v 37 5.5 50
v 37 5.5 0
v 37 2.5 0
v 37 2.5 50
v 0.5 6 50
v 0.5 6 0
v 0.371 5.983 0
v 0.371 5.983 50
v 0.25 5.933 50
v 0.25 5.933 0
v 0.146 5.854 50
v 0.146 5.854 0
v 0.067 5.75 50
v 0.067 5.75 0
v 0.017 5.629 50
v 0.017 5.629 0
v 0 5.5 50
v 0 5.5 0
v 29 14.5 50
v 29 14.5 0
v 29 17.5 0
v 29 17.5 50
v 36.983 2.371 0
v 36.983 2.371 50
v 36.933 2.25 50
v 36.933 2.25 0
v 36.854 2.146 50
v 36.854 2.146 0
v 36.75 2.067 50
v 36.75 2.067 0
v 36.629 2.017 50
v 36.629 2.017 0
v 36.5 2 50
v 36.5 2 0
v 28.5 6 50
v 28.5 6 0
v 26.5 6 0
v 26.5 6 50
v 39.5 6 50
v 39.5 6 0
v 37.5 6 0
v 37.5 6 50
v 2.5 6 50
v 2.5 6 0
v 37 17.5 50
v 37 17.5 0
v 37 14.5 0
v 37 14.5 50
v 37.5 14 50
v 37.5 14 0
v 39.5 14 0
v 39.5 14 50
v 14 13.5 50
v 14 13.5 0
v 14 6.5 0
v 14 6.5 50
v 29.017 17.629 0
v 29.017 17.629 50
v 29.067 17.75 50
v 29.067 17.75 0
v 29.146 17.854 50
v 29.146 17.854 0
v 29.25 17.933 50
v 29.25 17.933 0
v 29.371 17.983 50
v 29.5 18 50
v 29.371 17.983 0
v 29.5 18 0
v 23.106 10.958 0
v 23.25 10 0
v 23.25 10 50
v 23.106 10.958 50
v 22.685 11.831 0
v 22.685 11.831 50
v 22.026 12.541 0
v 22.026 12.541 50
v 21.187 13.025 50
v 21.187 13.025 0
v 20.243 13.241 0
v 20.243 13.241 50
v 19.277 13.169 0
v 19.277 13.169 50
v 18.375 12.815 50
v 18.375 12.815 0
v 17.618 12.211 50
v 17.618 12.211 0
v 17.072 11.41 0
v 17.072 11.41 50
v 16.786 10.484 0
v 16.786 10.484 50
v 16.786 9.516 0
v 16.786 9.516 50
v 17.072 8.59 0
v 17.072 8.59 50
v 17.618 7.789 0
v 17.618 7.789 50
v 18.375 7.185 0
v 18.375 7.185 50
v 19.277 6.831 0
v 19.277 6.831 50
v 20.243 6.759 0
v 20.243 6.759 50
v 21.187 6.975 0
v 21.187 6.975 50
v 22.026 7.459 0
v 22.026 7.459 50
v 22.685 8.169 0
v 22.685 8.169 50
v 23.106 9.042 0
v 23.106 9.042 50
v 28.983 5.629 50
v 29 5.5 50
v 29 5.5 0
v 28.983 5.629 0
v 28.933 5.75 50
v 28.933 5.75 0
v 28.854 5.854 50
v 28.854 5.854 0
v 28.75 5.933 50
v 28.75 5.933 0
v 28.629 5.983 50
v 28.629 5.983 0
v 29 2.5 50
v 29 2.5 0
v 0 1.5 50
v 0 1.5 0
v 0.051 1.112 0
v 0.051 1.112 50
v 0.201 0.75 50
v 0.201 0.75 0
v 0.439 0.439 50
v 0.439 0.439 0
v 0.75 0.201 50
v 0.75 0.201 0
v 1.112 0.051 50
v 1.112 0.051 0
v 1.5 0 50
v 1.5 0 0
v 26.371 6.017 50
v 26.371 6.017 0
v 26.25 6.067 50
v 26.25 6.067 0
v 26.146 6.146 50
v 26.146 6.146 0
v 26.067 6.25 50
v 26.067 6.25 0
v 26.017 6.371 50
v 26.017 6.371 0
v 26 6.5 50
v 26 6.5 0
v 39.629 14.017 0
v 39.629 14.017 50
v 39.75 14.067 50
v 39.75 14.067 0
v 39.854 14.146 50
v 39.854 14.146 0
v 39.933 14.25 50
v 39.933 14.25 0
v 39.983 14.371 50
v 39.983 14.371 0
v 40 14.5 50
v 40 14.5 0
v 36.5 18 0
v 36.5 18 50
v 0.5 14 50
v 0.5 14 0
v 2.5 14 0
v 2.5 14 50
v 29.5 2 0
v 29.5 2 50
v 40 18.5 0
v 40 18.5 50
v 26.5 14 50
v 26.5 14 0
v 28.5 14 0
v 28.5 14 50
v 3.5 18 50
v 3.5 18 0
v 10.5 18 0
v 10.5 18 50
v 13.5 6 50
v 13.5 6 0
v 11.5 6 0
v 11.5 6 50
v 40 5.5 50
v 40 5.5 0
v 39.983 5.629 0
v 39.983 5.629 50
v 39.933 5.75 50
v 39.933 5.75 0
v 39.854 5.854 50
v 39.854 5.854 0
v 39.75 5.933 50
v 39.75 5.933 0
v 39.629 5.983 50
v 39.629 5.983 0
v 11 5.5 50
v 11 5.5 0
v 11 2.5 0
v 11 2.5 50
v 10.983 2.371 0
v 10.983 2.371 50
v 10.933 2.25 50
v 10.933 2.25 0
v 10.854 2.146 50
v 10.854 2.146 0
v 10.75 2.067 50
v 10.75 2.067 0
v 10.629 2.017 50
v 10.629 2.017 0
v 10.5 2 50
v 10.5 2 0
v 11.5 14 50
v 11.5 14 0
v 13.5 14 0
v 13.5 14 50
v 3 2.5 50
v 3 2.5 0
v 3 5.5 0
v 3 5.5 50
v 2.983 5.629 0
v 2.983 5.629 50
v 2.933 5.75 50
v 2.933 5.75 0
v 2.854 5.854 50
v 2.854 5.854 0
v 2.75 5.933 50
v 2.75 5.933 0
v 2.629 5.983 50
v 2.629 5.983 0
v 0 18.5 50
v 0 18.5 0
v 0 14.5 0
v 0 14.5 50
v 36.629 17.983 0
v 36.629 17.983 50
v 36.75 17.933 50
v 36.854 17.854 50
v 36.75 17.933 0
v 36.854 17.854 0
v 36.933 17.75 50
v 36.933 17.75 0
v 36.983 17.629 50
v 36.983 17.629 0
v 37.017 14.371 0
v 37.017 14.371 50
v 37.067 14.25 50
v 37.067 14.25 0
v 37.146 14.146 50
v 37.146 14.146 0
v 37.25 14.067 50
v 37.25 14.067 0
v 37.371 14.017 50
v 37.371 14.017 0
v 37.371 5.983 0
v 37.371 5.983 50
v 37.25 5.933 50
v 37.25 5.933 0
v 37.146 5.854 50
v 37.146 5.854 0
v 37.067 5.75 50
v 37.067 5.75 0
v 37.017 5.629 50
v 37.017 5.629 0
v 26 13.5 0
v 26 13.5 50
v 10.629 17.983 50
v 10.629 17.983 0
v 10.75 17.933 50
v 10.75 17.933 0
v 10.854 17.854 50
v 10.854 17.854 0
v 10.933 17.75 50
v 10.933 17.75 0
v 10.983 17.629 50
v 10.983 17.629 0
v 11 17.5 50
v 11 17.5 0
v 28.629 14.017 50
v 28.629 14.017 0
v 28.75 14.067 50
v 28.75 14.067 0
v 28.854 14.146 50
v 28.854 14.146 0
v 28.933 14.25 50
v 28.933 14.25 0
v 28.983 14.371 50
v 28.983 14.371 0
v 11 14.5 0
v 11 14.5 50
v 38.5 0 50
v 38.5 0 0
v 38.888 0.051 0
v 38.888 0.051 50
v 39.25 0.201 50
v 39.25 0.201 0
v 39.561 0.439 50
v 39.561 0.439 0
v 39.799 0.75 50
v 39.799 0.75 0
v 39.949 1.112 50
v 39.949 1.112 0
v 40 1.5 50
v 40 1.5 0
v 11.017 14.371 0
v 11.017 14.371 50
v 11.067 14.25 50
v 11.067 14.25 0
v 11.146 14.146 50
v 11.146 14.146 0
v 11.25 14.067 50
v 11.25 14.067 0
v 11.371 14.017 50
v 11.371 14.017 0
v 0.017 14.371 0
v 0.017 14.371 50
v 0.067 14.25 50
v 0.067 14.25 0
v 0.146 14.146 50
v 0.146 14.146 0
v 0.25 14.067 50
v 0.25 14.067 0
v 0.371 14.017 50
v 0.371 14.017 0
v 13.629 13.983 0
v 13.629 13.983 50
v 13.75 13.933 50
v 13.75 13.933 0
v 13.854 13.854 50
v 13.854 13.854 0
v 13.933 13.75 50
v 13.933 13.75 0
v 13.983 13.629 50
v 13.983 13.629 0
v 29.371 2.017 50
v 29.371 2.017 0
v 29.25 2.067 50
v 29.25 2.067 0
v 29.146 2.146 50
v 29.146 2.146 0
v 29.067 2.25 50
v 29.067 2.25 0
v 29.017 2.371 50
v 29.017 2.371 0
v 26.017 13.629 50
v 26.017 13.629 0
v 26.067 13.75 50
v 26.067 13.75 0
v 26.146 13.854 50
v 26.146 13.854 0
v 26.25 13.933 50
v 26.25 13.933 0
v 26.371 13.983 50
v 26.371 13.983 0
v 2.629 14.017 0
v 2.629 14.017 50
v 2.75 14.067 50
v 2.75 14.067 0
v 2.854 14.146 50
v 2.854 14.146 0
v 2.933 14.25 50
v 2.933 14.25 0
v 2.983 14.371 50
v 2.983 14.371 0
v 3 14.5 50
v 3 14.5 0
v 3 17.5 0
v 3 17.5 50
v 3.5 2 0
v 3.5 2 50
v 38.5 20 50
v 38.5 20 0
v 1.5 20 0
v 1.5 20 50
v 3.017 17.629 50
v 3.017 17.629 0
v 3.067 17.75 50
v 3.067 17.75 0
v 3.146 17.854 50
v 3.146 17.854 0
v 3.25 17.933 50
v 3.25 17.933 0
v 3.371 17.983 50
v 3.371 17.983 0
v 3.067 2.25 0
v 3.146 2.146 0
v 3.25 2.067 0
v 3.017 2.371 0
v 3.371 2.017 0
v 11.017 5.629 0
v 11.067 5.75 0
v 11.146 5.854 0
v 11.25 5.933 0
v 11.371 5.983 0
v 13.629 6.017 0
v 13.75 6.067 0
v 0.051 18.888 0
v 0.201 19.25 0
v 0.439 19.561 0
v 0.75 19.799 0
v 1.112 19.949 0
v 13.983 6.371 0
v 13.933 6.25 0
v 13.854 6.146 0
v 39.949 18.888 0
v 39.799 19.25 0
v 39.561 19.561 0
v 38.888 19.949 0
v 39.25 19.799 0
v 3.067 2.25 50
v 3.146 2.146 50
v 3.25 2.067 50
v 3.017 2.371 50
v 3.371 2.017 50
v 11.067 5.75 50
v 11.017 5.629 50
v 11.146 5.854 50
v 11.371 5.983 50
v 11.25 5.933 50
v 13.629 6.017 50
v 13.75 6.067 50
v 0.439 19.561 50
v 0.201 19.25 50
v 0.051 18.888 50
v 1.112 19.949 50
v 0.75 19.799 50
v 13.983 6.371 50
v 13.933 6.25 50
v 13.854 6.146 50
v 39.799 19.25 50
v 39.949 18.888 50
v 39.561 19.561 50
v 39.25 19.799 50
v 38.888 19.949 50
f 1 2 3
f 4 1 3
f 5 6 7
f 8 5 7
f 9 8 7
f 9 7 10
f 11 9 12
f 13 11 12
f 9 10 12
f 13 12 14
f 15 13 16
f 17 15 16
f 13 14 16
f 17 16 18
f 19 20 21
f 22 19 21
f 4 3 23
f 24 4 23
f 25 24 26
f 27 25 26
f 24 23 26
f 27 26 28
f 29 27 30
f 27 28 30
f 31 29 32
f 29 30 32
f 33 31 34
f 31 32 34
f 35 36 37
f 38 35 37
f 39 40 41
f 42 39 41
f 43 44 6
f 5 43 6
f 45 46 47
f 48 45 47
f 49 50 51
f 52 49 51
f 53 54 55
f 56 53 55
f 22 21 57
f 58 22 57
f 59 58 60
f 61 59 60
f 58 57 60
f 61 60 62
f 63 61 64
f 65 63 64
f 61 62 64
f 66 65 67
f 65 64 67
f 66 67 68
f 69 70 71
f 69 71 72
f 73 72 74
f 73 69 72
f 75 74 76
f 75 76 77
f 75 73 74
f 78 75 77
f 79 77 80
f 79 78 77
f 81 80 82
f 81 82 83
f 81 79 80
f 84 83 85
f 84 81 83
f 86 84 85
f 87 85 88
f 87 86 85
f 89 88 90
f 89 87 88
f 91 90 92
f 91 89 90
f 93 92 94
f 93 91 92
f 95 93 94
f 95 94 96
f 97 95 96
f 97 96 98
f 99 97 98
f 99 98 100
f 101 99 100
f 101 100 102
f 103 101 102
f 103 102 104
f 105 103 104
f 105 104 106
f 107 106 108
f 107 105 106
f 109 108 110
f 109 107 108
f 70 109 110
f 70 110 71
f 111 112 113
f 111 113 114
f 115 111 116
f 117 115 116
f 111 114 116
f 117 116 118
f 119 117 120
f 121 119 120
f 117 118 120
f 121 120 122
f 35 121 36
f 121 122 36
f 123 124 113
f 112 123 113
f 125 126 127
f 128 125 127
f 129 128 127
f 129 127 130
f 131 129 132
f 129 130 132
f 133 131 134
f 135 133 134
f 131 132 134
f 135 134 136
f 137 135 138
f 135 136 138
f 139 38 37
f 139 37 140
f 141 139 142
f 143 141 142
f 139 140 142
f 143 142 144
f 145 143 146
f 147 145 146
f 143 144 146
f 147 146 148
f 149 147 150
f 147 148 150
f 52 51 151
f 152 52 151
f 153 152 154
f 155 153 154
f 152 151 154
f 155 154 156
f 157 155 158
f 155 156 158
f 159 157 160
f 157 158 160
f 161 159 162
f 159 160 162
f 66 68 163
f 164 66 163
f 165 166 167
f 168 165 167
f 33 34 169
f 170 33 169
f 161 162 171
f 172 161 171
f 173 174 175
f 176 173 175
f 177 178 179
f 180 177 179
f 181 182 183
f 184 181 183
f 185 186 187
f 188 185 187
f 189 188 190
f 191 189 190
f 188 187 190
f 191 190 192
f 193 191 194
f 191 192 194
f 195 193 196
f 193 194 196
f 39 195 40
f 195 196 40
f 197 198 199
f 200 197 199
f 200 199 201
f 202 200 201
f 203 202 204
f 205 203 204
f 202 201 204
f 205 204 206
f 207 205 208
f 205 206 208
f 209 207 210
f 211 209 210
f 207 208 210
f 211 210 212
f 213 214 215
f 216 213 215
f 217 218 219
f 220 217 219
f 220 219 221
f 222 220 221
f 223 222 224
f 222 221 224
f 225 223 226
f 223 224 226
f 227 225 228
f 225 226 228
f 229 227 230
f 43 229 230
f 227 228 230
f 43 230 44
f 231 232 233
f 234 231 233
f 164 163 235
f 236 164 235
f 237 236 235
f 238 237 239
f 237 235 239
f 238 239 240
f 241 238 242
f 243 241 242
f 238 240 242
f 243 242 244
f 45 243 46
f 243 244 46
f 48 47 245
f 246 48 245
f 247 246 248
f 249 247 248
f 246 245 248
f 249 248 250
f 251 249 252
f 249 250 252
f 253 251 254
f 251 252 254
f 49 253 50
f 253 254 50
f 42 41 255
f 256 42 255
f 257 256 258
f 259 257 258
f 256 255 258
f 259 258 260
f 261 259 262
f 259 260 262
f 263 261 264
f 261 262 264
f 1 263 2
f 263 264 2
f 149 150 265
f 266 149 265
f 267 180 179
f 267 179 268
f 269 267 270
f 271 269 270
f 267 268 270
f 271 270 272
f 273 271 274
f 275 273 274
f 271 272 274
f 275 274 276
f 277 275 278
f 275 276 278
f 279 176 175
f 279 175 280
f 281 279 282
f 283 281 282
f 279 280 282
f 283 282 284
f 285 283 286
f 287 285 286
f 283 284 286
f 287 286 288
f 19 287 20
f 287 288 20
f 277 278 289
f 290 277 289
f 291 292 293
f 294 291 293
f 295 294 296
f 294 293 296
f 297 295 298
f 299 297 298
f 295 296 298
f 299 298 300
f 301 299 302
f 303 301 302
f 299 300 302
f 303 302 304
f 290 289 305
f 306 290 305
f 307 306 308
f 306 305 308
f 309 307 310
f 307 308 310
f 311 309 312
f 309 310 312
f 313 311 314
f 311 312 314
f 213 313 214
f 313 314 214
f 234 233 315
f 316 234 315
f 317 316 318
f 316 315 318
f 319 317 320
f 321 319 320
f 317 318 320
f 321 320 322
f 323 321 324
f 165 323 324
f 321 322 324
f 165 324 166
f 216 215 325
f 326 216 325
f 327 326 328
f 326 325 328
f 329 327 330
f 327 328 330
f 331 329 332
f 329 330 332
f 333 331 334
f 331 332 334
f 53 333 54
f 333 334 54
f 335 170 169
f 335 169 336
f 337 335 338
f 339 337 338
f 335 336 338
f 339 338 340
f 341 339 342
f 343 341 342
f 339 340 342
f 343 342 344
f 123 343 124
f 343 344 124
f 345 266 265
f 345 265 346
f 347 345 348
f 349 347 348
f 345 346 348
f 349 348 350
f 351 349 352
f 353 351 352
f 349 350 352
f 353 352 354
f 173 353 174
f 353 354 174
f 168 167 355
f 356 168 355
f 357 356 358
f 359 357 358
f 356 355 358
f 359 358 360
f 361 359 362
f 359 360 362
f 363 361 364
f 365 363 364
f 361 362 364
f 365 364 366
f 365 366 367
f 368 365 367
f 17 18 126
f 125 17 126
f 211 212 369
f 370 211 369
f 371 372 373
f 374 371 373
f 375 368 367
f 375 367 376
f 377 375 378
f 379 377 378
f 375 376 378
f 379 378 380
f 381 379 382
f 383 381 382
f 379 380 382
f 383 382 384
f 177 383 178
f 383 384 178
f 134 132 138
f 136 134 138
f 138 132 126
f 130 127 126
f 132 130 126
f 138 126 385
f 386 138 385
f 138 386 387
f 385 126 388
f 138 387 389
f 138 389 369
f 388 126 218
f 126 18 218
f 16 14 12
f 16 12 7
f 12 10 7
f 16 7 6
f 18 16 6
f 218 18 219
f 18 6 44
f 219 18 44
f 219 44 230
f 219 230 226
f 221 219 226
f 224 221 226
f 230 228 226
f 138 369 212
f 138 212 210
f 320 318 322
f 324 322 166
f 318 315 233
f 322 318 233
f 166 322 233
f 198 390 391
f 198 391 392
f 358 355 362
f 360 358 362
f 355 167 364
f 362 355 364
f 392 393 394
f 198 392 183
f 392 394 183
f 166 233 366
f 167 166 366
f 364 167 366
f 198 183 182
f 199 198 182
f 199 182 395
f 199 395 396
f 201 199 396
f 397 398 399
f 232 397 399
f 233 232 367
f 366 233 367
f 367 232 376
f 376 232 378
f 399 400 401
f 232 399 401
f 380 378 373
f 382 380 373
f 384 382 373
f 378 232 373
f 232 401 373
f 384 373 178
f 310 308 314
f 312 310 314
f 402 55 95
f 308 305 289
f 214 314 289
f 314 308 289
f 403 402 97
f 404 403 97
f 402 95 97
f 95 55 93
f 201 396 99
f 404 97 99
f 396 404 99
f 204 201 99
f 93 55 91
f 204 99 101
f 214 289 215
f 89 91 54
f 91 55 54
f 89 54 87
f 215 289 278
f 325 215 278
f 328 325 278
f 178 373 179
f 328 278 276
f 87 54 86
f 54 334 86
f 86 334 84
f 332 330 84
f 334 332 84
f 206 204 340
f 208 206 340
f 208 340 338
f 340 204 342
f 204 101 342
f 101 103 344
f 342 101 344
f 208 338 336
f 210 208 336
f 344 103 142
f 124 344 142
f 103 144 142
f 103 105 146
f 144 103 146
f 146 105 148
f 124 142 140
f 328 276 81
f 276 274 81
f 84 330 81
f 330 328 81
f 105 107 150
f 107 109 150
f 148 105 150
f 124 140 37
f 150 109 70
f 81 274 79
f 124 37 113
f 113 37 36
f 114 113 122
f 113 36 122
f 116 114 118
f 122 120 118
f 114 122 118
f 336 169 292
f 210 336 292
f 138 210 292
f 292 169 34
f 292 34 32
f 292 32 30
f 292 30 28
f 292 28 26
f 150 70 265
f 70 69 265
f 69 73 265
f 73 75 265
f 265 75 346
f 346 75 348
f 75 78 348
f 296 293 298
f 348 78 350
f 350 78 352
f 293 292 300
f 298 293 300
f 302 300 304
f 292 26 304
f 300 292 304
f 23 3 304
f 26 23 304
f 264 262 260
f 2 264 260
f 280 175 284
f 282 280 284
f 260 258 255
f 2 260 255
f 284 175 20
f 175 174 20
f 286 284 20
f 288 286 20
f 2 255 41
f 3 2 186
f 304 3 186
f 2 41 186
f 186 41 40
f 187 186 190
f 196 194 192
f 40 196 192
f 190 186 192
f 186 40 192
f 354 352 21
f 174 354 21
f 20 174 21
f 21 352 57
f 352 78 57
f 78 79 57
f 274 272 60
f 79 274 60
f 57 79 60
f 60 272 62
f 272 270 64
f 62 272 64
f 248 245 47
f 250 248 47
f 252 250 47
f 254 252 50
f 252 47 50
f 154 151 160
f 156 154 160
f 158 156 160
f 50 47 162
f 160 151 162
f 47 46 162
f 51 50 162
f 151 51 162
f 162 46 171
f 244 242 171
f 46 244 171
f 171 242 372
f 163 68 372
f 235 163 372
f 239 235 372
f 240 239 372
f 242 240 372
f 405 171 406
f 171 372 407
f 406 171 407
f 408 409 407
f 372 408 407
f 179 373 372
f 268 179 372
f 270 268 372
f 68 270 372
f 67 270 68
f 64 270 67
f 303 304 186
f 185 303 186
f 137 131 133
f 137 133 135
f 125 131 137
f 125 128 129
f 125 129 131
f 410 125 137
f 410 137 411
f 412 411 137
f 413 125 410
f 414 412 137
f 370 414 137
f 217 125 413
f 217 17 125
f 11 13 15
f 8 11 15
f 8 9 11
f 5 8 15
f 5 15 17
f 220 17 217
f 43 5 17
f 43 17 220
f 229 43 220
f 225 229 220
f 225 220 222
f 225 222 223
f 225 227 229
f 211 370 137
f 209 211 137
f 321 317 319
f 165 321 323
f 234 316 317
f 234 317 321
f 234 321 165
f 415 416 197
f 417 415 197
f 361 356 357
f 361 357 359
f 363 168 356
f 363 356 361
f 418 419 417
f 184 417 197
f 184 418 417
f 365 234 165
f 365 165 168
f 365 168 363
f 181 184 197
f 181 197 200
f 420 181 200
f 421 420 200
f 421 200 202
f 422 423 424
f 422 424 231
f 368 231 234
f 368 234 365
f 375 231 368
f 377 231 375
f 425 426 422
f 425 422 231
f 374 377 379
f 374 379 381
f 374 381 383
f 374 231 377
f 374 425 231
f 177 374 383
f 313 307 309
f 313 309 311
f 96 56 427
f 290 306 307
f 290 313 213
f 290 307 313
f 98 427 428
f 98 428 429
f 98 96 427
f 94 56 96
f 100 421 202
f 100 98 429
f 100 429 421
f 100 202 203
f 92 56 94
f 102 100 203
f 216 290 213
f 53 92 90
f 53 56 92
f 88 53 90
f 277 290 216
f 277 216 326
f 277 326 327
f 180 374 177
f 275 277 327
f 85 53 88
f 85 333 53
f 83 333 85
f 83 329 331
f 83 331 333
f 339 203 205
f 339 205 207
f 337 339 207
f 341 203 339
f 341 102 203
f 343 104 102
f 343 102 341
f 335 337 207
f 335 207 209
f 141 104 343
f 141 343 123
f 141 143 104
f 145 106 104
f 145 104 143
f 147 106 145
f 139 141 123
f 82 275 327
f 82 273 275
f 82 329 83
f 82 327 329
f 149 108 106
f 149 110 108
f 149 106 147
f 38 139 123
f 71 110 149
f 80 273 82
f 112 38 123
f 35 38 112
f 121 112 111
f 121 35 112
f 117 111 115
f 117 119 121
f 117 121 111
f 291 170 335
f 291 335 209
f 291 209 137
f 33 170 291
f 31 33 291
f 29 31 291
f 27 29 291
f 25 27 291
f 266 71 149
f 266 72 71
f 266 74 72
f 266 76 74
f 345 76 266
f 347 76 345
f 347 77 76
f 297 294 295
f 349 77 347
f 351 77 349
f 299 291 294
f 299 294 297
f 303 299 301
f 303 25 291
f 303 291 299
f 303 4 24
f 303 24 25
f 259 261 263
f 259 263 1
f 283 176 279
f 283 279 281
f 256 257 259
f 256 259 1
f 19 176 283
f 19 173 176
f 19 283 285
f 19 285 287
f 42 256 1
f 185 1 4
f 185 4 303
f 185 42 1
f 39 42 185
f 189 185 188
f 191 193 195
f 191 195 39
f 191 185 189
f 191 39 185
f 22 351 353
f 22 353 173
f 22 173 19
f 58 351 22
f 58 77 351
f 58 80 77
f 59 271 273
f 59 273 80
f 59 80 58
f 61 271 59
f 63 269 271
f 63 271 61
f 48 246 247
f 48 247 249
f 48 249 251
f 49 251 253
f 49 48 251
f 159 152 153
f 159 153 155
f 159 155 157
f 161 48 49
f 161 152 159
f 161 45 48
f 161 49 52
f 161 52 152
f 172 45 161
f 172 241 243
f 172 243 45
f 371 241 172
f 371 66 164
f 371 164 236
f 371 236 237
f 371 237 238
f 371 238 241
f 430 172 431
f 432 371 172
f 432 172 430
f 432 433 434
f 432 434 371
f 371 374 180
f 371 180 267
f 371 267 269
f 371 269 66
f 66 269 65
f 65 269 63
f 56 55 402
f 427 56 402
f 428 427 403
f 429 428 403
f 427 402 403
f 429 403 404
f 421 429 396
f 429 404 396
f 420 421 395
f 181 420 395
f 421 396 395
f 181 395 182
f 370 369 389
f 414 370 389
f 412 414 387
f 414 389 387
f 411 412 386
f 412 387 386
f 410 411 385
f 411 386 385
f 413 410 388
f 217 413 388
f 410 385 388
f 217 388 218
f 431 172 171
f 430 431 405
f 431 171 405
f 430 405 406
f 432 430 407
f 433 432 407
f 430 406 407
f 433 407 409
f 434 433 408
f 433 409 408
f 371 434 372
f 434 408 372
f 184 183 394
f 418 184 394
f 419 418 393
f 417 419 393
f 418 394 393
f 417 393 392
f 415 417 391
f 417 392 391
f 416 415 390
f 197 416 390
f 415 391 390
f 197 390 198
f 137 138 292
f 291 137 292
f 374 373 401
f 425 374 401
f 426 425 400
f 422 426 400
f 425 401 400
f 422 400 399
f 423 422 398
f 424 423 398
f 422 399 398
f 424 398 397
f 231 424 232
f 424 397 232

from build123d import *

# Parameters (mm, degrees)
SKETCH1_R           = 3.25
BOSS_EXTRUDE1_DEPTH = 50


with BuildPart() as part:
    # Sketch1 → Boss-Extrude1 (new body)
    with BuildSketch(Plane.XY):
        with BuildLine():
            Line((1.5, 0), (38.5, 0))
            ThreePointArc((38.5, 0), (39.560660172, 0.439339828), (40, 1.5))
            Line((40, 1.5), (40, 5.5))
            ThreePointArc((40, 5.5), (39.853553391, 5.853553391), (39.5, 6))
            Line((39.5, 6), (37.5, 6))
            ThreePointArc((37.5, 6), (37.146446609, 5.853553391), (37, 5.5))
            Line((37, 5.5), (37, 2.5))
            ThreePointArc((37, 2.5), (36.853553391, 2.146446609), (36.5, 2))
            Line((36.5, 2), (29.5, 2))
            ThreePointArc((29.5, 2), (29.146446609, 2.146446609), (29, 2.5))
            Line((29, 2.5), (29, 5.5))
            ThreePointArc((29, 5.5), (28.853553391, 5.853553391), (28.5, 6))
            Line((28.5, 6), (26.5, 6))
            ThreePointArc((26.5, 6), (26.146446609, 6.146446609), (26, 6.5))
            Line((26, 6.5), (26, 13.5))
            ThreePointArc((26, 13.5), (26.146446609, 13.853553391), (26.5, 14))
            Line((26.5, 14), (28.5, 14))
            ThreePointArc((28.5, 14), (28.853553391, 14.146446609), (29, 14.5))
            Line((29, 14.5), (29, 17.5))
            ThreePointArc((29, 17.5), (29.146446609, 17.853553391), (29.5, 18))
            Line((29.5, 18), (36.5, 18))
            ThreePointArc((36.5, 18), (36.853553391, 17.853553391), (37, 17.5))
            Line((37, 17.5), (37, 14.5))
            ThreePointArc((37, 14.5), (37.146446609, 14.146446609), (37.5, 14))
            Line((37.5, 14), (39.5, 14))
            ThreePointArc((39.5, 14), (39.853553391, 14.146446609), (40, 14.5))
            Line((40, 14.5), (40, 18.5))
            ThreePointArc((40, 18.5), (39.560660172, 19.560660172), (38.5, 20))
            Line((38.5, 20), (1.5, 20))
            ThreePointArc((1.5, 20), (0.439339828, 19.560660172), (0, 18.5))
            Line((0, 18.5), (0, 14.5))
            ThreePointArc((0, 14.5), (0.146446609, 14.146446609), (0.5, 14))
            Line((0.5, 14), (2.5, 14))
            ThreePointArc((2.5, 14), (2.853553391, 14.146446609), (3, 14.5))
            Line((3, 14.5), (3, 17.5))
            ThreePointArc((3, 17.5), (3.146446609, 17.853553391), (3.5, 18))
            Line((3.5, 18), (10.5, 18))
            ThreePointArc((10.5, 18), (10.853553391, 17.853553391), (11, 17.5))
            Line((11, 17.5), (11, 14.5))
            ThreePointArc((11, 14.5), (11.146446609, 14.146446609), (11.5, 14))
            Line((11.5, 14), (13.5, 14))
            ThreePointArc((13.5, 14), (13.853553391, 13.853553391), (14, 13.5))
            Line((14, 13.5), (14, 6.5))
            ThreePointArc((14, 6.5), (13.853553391, 6.146446609), (13.5, 6))
            Line((13.5, 6), (11.5, 6))
            ThreePointArc((11.5, 6), (11.146446609, 5.853553391), (11, 5.5))
            Line((11, 5.5), (11, 2.5))
            ThreePointArc((11, 2.5), (10.853553391, 2.146446609), (10.5, 2))
            Line((10.5, 2), (3.5, 2))
            ThreePointArc((3.5, 2), (3.146446609, 2.146446609), (3, 2.5))
            Line((3, 2.5), (3, 5.5))
            ThreePointArc((3, 5.5), (2.853553391, 5.853553391), (2.5, 6))
            Line((2.5, 6), (0.5, 6))
            ThreePointArc((0.5, 6), (0.146446609, 5.853553391), (0, 5.5))
            Line((0, 5.5), (0, 1.5))
            ThreePointArc((0, 1.5), (0.439339828, 0.439339828), (1.5, 0))
        make_face()
        with Locations((20, 10)):
            Circle(SKETCH1_R, mode=Mode.SUBTRACT)
    extrude(amount=BOSS_EXTRUDE1_DEPTH)


solid = part.part
